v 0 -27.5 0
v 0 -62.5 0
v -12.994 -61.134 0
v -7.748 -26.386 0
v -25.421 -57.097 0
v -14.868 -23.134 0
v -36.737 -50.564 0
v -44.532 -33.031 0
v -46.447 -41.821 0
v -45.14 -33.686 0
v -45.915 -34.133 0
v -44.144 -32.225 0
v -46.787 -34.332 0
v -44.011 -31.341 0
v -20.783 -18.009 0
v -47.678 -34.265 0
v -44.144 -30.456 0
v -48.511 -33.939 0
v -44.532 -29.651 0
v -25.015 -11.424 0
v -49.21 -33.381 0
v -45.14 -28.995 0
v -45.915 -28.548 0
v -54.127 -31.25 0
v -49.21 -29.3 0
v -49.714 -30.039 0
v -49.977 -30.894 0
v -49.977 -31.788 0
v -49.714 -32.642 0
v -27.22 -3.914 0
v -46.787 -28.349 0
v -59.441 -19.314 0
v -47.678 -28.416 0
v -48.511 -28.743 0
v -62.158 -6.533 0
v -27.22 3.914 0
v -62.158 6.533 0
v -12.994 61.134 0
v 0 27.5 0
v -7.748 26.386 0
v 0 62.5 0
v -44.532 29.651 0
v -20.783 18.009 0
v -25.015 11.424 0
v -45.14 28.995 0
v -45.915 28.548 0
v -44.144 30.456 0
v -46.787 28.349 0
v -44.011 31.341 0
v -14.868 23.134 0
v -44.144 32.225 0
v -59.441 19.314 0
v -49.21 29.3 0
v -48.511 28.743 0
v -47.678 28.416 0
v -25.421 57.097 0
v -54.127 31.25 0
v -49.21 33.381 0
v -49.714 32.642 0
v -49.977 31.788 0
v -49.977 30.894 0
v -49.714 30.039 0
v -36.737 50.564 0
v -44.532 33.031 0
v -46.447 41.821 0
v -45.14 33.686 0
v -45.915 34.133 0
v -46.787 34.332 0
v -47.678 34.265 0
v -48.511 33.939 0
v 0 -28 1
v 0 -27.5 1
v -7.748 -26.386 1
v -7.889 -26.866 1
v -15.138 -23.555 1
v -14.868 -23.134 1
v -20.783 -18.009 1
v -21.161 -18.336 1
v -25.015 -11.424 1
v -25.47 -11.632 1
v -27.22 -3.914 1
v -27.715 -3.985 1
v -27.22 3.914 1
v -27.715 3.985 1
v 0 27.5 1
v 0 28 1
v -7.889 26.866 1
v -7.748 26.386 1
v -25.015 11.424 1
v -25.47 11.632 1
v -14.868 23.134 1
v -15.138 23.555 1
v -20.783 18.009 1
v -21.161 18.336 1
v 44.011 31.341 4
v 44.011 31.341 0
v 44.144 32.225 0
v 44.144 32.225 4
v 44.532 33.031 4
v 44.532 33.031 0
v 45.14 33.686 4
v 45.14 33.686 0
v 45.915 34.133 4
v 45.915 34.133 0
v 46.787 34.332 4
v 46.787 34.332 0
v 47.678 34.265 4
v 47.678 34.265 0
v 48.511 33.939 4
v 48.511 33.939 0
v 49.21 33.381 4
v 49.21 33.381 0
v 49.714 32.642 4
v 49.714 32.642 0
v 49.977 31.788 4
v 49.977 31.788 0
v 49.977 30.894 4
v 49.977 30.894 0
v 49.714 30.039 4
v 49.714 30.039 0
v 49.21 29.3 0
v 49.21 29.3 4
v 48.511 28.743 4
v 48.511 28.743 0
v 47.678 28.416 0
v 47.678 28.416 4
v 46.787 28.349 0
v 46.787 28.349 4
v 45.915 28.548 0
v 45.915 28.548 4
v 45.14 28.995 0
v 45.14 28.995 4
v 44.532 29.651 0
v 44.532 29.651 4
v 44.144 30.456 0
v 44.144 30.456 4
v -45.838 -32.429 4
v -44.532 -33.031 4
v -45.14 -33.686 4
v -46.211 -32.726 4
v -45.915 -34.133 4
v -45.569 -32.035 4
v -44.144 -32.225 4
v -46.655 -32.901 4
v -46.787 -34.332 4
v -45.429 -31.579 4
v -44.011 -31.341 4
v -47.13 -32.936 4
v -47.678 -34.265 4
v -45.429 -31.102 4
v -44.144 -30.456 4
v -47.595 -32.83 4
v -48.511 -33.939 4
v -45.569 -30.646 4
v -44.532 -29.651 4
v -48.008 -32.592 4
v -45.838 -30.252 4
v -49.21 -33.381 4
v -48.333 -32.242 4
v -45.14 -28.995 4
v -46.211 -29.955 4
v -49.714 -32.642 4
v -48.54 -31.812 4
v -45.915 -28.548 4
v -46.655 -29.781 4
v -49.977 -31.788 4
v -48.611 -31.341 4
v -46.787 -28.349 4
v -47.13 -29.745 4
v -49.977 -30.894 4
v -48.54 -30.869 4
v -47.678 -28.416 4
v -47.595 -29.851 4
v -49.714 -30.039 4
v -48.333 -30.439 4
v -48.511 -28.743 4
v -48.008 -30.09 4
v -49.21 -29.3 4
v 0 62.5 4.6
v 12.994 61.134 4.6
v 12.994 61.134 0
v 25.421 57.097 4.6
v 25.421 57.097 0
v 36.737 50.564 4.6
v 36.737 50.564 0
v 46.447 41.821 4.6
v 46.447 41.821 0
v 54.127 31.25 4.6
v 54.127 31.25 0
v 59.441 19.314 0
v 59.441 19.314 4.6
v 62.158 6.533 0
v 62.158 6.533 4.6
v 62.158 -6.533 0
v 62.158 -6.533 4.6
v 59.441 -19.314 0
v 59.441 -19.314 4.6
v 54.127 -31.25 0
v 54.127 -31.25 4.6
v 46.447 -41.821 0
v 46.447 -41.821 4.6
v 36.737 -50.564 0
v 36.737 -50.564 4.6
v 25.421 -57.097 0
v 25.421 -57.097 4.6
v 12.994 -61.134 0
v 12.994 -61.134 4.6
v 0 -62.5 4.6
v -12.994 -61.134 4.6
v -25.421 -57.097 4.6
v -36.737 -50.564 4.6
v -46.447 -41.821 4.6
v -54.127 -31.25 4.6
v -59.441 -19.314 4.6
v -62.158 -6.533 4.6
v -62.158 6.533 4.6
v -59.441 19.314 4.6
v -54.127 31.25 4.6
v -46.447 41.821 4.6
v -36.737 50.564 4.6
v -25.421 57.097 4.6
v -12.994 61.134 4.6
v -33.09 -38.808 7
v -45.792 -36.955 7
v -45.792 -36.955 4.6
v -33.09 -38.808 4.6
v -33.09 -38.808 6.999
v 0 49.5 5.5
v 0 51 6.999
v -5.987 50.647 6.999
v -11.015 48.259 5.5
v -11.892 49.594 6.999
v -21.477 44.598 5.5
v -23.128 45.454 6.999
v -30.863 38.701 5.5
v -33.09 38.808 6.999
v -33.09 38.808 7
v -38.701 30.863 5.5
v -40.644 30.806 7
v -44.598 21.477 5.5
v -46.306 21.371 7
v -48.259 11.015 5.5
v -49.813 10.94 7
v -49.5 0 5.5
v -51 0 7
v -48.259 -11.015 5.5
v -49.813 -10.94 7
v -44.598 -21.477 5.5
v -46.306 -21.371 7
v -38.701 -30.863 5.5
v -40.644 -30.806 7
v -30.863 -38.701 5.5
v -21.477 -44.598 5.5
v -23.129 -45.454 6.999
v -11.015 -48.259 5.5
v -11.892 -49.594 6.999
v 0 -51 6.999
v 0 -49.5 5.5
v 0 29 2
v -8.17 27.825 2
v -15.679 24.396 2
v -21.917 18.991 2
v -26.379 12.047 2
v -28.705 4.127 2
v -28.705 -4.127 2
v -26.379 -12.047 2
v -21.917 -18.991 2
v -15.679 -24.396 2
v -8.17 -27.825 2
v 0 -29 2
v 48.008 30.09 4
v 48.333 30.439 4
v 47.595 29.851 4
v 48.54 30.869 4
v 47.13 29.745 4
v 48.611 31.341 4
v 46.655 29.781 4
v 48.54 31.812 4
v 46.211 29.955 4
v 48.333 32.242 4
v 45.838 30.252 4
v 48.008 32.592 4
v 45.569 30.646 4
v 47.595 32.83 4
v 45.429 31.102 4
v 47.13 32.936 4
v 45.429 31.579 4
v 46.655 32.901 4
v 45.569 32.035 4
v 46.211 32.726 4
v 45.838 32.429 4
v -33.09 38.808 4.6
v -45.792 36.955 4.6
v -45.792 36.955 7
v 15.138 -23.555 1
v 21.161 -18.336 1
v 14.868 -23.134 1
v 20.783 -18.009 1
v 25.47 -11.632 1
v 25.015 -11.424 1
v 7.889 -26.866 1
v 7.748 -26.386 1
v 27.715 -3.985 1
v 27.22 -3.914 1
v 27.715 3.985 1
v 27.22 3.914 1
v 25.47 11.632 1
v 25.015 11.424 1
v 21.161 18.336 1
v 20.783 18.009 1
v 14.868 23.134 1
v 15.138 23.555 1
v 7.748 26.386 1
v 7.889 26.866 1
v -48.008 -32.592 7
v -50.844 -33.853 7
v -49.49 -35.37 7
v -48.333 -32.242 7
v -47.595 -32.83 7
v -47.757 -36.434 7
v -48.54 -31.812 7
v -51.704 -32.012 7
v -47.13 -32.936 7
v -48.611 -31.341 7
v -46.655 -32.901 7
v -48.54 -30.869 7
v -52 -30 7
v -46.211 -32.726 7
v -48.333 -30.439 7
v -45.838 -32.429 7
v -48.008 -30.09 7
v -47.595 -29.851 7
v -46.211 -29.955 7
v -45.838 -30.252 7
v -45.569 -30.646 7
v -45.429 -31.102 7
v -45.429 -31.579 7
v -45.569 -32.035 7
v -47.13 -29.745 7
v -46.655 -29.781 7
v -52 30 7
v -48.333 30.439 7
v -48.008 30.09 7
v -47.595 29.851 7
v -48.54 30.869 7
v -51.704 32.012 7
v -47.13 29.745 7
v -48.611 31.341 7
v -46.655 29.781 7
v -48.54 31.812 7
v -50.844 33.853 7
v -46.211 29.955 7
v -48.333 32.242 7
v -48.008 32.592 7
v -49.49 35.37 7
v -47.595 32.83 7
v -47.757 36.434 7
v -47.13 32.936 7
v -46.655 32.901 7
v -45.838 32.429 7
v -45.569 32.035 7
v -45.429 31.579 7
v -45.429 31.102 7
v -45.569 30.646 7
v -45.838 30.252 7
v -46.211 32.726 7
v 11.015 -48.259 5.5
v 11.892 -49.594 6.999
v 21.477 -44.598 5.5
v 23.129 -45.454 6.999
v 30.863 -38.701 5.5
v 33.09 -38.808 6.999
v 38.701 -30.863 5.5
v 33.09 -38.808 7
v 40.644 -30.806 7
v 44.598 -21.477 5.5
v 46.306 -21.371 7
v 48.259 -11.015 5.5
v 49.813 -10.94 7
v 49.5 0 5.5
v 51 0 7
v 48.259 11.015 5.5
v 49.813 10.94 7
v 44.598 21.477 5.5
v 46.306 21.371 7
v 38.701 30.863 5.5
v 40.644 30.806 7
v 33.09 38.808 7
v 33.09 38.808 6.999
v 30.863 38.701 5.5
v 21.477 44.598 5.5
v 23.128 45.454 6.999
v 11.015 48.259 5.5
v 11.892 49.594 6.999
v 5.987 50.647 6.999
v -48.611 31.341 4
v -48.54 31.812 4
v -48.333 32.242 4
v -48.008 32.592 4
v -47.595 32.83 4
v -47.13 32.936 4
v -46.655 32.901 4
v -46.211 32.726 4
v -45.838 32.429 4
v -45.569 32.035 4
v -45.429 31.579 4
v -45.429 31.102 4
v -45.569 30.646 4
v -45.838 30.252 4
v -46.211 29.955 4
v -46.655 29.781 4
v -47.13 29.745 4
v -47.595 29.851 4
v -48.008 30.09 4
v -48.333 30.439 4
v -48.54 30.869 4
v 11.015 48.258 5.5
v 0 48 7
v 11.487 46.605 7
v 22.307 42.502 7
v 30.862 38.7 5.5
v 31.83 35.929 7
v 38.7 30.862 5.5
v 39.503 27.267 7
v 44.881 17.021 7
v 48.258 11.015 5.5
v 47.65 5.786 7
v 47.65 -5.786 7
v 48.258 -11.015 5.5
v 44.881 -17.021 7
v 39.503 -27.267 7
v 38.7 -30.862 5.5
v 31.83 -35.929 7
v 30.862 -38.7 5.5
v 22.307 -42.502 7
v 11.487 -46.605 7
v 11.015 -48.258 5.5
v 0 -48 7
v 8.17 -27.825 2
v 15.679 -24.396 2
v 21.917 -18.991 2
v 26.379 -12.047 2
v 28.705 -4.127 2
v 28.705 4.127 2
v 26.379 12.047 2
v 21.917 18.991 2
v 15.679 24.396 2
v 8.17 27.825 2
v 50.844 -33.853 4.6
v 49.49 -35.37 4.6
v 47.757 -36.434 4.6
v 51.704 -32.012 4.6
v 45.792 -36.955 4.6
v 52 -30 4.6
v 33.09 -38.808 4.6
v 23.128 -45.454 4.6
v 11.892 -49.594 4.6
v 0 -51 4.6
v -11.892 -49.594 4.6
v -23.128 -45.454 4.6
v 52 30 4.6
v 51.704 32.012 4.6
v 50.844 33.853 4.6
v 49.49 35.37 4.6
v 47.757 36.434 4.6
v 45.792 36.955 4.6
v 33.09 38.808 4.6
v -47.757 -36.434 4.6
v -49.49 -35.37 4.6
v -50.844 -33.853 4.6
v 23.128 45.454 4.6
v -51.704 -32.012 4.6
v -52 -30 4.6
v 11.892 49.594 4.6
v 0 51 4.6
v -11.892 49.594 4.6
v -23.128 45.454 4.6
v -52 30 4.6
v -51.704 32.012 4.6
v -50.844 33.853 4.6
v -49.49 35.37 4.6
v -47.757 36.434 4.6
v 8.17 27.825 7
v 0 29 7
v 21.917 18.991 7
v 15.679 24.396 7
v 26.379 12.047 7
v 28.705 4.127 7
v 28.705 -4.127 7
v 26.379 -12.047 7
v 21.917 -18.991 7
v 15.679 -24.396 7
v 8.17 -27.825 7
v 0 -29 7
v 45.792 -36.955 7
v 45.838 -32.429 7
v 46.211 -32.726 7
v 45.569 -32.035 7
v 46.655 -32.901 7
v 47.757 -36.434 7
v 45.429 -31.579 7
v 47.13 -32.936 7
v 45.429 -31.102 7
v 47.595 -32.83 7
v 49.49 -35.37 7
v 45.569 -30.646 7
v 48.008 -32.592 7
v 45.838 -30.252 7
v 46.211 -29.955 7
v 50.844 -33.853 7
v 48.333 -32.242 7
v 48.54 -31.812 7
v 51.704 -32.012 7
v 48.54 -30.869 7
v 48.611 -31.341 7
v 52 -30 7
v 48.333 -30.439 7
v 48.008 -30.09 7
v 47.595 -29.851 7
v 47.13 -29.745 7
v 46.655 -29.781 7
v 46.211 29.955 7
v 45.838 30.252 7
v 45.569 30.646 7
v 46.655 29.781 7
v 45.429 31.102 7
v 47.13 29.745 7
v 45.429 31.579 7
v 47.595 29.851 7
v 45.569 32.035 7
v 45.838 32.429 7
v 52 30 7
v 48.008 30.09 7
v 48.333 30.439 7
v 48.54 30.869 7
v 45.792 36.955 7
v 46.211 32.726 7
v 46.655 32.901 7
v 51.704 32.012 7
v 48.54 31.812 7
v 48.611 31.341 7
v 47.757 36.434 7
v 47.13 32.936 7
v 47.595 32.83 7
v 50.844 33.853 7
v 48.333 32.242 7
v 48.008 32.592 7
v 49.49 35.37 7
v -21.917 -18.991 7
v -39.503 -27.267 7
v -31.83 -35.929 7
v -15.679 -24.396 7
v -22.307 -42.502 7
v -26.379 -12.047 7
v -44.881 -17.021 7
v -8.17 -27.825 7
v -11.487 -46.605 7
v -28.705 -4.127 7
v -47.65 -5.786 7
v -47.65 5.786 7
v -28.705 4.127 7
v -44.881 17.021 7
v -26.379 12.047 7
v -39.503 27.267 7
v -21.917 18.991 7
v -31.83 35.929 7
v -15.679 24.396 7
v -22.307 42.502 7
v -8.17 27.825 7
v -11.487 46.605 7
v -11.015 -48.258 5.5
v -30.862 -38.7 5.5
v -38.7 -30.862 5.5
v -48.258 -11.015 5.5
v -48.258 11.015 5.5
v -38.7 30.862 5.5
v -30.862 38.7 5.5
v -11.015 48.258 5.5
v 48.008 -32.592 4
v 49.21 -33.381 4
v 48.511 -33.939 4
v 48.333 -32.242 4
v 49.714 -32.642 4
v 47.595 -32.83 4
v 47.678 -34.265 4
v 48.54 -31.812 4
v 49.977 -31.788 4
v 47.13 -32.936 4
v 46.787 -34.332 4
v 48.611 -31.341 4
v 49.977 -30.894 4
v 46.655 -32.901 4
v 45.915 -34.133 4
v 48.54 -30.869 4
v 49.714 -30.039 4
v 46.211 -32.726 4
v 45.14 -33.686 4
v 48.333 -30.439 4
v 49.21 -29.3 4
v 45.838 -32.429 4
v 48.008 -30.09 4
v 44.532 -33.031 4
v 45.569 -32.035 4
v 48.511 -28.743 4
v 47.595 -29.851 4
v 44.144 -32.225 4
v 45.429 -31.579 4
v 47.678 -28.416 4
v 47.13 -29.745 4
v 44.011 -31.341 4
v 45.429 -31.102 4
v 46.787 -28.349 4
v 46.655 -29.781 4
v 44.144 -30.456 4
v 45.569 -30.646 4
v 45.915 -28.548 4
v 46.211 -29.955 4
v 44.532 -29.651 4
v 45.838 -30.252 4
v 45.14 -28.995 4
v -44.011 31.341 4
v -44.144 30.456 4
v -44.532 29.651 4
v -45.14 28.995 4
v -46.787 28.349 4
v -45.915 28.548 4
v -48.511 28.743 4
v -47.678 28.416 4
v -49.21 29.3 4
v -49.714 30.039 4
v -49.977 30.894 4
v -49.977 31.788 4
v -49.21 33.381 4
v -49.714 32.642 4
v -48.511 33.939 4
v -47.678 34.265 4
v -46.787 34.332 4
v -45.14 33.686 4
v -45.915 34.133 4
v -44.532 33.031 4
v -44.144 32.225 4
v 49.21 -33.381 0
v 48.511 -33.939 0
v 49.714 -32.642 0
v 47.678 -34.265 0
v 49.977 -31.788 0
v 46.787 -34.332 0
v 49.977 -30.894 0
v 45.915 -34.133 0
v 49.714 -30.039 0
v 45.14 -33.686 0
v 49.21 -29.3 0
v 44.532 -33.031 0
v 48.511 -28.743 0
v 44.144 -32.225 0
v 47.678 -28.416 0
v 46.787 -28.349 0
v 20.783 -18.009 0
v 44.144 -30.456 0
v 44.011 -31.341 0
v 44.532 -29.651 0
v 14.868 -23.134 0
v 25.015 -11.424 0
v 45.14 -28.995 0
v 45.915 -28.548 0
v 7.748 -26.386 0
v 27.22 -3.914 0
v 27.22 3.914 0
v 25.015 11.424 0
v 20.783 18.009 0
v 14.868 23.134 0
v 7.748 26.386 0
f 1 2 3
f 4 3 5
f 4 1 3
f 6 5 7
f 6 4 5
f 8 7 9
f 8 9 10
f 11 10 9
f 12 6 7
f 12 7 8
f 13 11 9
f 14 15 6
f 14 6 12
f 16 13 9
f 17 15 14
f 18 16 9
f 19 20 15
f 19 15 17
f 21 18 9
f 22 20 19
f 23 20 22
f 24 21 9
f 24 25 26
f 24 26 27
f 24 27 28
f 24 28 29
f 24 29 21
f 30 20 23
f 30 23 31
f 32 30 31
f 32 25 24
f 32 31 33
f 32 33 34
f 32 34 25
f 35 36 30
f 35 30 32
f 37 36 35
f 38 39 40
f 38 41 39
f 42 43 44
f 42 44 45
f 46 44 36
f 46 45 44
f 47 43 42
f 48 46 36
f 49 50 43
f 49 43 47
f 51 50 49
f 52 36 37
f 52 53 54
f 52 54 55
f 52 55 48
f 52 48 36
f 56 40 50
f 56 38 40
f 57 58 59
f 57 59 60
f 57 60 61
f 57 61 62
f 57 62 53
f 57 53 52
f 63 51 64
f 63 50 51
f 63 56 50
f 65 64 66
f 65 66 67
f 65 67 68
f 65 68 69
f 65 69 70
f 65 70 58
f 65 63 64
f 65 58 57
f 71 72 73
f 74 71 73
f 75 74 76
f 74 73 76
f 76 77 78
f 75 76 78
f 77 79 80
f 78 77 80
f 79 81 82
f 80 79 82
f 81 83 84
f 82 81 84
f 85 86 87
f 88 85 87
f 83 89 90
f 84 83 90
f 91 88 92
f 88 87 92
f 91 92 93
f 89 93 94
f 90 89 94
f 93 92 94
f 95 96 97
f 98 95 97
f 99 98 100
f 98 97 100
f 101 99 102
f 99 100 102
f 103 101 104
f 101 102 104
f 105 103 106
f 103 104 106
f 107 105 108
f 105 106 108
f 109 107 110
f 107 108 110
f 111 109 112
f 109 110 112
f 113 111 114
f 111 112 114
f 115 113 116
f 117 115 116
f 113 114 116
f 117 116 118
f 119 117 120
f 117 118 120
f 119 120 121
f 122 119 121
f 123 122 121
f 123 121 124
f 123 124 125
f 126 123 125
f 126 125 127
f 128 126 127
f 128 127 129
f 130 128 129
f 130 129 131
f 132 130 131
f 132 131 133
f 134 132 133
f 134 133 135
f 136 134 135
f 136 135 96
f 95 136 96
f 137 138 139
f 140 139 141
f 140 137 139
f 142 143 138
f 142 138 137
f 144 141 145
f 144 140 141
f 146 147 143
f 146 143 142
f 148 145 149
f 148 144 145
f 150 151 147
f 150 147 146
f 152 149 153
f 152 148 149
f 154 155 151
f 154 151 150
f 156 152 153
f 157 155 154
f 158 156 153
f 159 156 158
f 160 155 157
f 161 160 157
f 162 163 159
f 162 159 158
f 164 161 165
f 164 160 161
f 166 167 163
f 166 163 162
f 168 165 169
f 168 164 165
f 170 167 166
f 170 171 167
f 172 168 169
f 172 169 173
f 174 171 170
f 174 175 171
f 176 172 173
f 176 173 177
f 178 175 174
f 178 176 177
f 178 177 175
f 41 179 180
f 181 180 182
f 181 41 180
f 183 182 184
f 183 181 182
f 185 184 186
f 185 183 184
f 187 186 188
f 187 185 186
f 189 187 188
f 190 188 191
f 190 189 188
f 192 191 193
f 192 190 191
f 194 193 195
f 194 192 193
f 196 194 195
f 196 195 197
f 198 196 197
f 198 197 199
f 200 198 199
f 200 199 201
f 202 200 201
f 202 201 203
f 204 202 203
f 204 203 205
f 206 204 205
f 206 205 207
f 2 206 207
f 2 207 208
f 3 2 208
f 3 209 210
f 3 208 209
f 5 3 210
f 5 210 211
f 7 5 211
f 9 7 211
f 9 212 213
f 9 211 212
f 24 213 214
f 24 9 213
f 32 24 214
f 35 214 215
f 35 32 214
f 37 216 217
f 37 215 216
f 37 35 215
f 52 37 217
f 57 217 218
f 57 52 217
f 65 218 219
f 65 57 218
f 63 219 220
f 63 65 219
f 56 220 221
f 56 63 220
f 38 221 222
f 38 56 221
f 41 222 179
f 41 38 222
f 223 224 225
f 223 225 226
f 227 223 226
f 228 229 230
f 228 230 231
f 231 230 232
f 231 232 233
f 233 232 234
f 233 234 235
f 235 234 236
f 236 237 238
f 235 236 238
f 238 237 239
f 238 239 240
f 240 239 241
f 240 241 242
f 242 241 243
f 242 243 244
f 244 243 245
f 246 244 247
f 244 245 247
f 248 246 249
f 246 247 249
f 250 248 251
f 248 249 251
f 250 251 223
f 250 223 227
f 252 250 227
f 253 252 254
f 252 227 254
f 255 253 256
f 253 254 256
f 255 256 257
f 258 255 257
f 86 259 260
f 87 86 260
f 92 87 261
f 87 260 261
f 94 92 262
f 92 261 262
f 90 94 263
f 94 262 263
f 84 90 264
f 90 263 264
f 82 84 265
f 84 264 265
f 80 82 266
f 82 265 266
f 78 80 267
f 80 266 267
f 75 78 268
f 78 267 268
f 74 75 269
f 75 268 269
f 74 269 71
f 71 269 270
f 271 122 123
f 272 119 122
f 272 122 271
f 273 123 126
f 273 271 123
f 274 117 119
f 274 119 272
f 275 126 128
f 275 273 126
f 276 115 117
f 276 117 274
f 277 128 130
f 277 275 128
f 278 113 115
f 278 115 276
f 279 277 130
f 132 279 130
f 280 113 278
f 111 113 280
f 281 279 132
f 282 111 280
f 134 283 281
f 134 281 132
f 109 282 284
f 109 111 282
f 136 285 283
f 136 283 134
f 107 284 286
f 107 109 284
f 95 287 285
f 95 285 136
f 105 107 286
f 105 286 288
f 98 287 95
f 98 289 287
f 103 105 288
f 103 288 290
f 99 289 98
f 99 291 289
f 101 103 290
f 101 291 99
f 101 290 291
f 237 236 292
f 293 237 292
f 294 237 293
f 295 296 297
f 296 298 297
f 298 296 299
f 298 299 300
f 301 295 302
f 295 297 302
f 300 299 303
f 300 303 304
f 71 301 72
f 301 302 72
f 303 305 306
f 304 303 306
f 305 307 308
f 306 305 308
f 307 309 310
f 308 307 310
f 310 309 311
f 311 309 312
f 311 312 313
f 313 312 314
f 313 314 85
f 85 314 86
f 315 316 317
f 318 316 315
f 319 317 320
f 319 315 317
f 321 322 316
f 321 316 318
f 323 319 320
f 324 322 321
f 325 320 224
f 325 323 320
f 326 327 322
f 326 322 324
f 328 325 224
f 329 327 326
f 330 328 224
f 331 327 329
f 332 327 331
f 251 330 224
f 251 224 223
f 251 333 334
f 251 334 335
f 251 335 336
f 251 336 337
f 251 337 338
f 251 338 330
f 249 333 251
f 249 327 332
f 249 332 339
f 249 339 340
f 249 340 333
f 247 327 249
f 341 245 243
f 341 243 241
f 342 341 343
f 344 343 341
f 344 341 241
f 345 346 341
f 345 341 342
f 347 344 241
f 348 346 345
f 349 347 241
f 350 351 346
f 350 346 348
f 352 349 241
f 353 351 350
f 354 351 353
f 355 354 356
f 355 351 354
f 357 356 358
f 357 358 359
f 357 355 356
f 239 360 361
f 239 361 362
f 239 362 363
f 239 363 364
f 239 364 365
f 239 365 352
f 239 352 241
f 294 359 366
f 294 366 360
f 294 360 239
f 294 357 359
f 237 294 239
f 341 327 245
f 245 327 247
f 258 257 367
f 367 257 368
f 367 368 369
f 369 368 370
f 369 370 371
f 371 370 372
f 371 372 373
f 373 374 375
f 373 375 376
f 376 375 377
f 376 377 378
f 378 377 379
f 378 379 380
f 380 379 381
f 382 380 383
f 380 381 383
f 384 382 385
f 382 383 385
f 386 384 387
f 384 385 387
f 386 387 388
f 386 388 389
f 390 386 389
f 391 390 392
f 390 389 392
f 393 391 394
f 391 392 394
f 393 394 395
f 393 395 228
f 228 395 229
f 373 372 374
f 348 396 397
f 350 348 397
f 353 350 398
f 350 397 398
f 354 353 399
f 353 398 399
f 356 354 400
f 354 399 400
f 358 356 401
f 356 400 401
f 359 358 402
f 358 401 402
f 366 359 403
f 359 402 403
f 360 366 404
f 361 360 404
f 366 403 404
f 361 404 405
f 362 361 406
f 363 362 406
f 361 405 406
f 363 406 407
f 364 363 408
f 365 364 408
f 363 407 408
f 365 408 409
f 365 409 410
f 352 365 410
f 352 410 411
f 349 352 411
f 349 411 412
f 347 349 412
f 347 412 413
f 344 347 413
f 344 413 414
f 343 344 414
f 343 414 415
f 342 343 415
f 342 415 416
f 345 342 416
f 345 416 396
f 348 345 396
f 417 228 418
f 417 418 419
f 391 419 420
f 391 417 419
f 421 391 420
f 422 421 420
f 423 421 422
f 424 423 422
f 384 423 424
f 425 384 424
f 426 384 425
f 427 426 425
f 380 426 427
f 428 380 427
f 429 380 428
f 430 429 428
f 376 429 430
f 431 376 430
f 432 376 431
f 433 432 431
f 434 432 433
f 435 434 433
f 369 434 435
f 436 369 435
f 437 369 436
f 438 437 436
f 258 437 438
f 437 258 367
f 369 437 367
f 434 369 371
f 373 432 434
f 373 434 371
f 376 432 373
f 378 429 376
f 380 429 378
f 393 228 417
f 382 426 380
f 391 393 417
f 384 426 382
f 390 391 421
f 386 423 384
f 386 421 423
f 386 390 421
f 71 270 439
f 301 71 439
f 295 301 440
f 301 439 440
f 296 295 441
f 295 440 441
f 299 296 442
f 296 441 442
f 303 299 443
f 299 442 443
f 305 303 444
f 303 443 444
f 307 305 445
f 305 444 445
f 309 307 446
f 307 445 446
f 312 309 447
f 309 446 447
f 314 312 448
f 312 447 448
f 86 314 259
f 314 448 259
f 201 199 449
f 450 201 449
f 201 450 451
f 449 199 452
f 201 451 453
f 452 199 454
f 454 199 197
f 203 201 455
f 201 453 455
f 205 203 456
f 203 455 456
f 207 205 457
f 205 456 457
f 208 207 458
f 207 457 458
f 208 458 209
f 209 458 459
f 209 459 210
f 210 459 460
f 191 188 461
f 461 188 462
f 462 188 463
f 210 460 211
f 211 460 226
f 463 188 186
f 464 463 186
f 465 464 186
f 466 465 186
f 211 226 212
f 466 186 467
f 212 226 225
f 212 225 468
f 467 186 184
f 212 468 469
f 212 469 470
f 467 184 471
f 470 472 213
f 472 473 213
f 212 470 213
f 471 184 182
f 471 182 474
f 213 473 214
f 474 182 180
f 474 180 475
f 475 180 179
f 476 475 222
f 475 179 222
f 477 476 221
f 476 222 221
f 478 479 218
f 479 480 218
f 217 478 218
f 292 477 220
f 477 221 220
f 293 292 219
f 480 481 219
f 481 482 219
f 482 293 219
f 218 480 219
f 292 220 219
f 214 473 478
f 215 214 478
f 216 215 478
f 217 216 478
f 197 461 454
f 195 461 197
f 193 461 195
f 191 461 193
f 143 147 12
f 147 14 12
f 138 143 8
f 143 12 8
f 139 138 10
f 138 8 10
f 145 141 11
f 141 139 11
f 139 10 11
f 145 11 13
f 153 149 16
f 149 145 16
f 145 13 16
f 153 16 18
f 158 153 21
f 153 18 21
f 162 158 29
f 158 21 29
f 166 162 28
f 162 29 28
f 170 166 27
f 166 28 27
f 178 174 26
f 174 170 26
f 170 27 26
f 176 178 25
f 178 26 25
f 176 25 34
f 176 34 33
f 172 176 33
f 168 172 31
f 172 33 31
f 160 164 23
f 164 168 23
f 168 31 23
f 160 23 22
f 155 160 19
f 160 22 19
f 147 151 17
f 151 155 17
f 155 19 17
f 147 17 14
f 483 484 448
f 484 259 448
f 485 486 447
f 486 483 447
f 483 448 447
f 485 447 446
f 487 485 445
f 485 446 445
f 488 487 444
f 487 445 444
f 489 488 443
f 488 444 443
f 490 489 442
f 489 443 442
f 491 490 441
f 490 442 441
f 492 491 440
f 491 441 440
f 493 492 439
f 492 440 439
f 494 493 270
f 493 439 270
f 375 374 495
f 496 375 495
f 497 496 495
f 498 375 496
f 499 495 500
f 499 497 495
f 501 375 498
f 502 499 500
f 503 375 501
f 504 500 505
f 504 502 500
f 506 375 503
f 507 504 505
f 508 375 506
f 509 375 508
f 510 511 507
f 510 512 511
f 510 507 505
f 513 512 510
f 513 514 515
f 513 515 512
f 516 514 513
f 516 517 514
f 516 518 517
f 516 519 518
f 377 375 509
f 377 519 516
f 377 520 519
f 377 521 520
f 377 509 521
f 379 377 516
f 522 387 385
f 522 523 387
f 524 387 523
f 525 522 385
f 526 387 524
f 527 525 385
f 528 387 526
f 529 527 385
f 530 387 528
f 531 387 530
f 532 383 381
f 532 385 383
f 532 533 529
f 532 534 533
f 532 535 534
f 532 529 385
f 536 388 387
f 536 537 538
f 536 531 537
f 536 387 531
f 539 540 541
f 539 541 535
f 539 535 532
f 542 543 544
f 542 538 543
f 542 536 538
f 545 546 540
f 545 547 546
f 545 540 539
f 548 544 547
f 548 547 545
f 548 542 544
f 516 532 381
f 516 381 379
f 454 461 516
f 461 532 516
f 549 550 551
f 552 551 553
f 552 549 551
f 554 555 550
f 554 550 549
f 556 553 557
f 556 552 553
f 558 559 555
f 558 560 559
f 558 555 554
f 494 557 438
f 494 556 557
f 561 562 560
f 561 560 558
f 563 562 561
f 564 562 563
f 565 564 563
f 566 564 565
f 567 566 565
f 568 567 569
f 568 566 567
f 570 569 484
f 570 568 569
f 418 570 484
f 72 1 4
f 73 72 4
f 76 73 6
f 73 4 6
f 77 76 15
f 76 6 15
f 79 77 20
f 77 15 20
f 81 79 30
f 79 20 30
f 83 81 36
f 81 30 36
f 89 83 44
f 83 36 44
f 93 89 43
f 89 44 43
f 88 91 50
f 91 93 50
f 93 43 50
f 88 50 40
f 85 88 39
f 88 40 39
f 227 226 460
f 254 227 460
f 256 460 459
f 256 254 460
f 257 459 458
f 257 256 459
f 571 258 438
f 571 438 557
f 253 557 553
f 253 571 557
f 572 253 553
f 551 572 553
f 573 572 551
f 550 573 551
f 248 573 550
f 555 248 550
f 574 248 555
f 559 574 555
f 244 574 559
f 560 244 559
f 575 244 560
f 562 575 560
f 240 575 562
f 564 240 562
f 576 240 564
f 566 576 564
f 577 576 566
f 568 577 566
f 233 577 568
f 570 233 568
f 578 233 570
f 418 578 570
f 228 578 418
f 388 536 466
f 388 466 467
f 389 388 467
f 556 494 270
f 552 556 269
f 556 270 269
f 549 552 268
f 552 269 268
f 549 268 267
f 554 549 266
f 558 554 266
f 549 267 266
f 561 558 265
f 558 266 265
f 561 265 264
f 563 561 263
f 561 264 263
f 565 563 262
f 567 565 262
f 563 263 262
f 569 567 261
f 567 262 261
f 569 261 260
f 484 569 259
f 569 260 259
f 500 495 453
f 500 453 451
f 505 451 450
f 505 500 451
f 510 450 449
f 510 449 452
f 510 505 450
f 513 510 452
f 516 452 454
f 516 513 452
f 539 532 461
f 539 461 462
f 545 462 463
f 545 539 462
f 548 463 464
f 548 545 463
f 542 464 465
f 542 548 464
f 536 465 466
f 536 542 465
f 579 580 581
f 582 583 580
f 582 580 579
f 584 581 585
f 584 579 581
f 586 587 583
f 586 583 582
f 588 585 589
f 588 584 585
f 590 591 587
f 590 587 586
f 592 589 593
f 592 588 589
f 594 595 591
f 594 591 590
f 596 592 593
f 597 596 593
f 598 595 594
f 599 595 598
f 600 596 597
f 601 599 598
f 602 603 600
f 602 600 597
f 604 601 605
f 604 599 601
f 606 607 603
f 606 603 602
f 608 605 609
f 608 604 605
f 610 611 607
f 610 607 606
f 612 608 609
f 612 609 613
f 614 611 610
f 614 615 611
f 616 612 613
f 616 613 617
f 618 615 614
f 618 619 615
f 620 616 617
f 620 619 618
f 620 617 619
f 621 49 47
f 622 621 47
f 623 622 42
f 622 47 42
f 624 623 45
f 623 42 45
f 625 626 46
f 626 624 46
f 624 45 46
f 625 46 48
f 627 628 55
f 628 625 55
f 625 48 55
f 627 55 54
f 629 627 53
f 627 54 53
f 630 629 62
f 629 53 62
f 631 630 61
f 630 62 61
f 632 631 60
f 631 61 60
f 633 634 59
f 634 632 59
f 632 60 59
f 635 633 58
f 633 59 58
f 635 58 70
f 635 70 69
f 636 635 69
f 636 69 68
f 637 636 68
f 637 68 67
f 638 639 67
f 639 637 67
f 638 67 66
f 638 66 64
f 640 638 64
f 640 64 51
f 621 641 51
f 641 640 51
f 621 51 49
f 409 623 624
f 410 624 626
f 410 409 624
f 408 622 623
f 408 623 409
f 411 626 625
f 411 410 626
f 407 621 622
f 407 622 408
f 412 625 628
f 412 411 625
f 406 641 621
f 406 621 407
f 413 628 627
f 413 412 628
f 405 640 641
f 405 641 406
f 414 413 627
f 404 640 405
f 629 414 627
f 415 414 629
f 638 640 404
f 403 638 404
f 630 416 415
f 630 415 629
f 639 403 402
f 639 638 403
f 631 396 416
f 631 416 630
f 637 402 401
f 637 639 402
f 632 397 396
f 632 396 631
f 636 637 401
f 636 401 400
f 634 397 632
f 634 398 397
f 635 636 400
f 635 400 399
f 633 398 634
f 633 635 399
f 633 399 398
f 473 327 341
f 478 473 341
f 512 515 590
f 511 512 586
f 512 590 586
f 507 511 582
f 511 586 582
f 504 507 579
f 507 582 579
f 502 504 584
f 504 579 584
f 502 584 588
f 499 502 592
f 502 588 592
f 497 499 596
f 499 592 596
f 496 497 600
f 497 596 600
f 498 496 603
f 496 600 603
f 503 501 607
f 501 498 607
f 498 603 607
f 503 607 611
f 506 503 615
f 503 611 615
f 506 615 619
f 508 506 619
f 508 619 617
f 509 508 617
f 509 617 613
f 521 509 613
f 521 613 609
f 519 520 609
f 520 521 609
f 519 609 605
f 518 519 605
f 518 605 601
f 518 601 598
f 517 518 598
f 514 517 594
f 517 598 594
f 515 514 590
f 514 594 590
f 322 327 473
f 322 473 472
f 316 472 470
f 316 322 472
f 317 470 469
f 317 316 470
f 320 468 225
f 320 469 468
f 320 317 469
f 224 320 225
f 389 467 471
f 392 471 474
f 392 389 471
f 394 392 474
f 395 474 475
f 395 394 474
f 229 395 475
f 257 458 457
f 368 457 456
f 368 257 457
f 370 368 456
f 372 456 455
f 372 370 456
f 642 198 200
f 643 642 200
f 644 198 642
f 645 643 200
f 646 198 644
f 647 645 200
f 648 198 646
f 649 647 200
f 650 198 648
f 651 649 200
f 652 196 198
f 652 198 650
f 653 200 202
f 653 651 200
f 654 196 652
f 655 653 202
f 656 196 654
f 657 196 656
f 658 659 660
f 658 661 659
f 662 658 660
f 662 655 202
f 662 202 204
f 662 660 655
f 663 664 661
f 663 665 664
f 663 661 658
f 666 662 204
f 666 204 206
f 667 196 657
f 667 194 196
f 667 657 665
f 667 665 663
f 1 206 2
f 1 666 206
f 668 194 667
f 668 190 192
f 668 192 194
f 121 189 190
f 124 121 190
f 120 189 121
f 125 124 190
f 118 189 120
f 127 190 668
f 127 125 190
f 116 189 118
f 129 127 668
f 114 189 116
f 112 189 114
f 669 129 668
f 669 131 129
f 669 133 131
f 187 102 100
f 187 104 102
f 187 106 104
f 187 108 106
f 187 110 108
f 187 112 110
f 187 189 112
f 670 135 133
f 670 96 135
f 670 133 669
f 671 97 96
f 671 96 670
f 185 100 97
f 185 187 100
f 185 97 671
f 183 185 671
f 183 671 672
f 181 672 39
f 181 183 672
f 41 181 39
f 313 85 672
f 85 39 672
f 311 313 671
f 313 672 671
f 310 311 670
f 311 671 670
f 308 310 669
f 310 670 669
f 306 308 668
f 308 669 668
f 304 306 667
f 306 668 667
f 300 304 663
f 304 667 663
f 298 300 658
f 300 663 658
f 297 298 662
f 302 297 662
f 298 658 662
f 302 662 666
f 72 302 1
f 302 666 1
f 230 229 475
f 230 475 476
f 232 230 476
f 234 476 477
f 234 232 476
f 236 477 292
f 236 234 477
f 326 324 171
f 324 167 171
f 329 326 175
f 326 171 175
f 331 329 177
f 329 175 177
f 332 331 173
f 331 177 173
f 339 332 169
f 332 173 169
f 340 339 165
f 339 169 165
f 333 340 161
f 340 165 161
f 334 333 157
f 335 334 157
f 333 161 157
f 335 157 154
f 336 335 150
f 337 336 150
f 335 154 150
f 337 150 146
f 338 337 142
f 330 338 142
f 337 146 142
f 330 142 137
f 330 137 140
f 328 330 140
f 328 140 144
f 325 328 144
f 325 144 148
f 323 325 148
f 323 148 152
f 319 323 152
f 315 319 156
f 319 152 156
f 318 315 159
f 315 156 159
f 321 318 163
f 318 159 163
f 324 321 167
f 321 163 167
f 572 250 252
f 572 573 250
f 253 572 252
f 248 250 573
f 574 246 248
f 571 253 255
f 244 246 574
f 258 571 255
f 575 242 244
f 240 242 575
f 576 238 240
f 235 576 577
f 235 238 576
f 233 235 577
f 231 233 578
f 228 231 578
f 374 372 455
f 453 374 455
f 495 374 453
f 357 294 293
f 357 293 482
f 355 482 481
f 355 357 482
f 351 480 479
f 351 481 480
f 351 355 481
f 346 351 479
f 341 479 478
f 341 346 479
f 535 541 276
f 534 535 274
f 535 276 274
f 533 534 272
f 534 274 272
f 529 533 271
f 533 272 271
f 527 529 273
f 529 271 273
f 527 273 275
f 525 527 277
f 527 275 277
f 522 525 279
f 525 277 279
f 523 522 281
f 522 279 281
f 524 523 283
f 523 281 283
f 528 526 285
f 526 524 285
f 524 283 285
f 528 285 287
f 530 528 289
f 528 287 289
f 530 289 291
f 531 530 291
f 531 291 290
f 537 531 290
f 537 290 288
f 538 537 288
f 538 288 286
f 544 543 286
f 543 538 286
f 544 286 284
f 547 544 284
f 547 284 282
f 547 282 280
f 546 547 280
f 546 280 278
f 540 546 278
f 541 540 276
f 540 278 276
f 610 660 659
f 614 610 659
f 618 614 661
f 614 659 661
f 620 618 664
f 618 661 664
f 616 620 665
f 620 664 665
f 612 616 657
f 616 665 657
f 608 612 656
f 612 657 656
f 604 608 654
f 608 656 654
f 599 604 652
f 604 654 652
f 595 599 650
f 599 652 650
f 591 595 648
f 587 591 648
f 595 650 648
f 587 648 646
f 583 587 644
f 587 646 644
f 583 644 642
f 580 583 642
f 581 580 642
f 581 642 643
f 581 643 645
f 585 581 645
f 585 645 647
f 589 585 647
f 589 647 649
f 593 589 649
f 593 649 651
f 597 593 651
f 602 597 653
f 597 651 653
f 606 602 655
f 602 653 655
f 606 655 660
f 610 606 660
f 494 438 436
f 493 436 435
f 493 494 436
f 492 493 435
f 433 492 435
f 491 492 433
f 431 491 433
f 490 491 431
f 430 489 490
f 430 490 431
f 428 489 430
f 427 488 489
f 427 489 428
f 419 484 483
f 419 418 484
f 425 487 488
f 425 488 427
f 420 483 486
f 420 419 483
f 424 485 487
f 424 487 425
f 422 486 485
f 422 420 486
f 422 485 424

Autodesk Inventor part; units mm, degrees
ref_plane "YZ Plane" through (0, 0, 0) normal (1, 0, 0) x (0, 1, 0)
ref_plane "XZ Plane" through (0, 0, 0) normal (0, 1, 0) x (-1, 0, 0)
ref_plane "XY Plane" through (0, 0, 0) normal (0, 0, 1) x (1, 0, 0)
sketch "Sketch1" plane through (0, 0, 0) normal (0, 0, 1) x (1, 0, 0)
  circle A0 centre (-47.0107, -31.3407) radius 4.8
  arc A1 (51.632, -32.6385) -> (49.9861, -35.1073) centre (47.0107, -31.3407) ccw
  arc A2 (51.632, -32.6385) -> (51.632, 32.6385) centre (0, 0) ccw
  arc A3 (49.9861, 35.1073) -> (51.632, 32.6385) centre (47.0107, 31.3407) ccw
  arc A4 (49.9861, 35.1073) -> (-42.369, 44) centre (0, 0) ccw
  line L0 (-42.369, 44) -> (-62, 44)
  line L1 (-62, 44) -> (-64, 42)
  line L2 (-64, 42) -> (-64, 0.1)
  arc A5 (0, -61.083) -> (49.9861, -35.1073) centre (0, 0) ccw
  circle A6 centre (0, 0) radius 48
  circle A7 centre (-58, 38) radius 3.825
  circle A8 centre (-47.0107, 31.3407) radius 4.8
  line L3 (0, 0) -> (-74.8823, 0)
  circle A9 centre (-58, -38) radius 3.825
  line L4 (-42.369, -44) -> (-62, -44)
  arc A10 (-42.369, -44) -> (49.9861, -35.1073) centre (0, 0) ccw
  line L5 (-62, -44) -> (-64, -42)
  line L6 (-64, -42) -> (-64, 0.1)
extrude "Extrusion1" add sketch "Sketch1" along normal blind 4.8
sketch "Sketch5" plane through (0, 0, 4.8) normal (0, 0, 1) x (1, 0, 0)
  circle A0 centre (0, 0) radius 48 projected
  circle A1 centre (-47.0107, 31.3407) radius 4.8 projected
  circle A2 centre (0, 0) radius 61.5
  arc A3 (49.9861, 35.1073) -> (51.632, 32.6385) centre (47.0107, 31.3407) ccw projected
  circle A4 centre (47.0107, 31.3407) radius 1.6
  arc A5 (51.632, -32.6385) -> (49.9861, -35.1073) centre (47.0107, -31.3407) ccw projected
  circle A6 centre (47.0107, -31.3407) radius 1.6
  circle A7 centre (-47.0107, -31.3407) radius 4.8 projected
  circle A8 centre (-47.0107, -31.3407) radius 1.6
  circle A9 centre (-47.0107, 31.3407) radius 4.8 projected
  circle A10 centre (-47.0107, 31.3407) radius 1.6
  dimension "d14" = 123
  dimension "d41" = 3.2
  dimension "d42" = 3.2
  dimension "d43" = 3.2
  dimension "d44" = 3.2
extrude "Extrusion5" add sketch "Sketch5" against normal up to surface (4.8 mm away) contours A1 | A2 | A7
sketch "Sketch8" plane through (0, 0, 0) normal (0, 0, -1) x (-1, 0, 0)
  circle A0 centre (0, 0) radius 48 projected
  circle A1 centre (0, 0) radius 29
  dimension "d30" = 58
extrude "Extrusion8" add sketch "Sketch8" against normal up to surface (4.8 mm away)
sketch "Sketch9" plane through (0, 0, 0) normal (0, 0, -1) x (-1, 0, 0)
  circle A0 centre (0, 0) radius 29 projected
  circle A1 centre (0, 0) radius 27.5
  dimension "d33" = 1.5
extrude "Extrusion9" add sketch "Sketch9" against normal blind 1
chamfer "Chamfer3" distance 1 angle 45 1 edges at (29, 0, 1)
sketch "Sketch10" plane through (0, 0, 4.8) normal (0, 0, 1) x (1, 0, 0)
  circle A0 centre (0, 0) radius 29 projected
  circle A1 centre (-58, 38) radius 3.825 projected
  arc A2 (-42.968, -44) -> (-42.968, 44) centre (0, 0) ccw projected
  line L0 (-42.968, 44) -> (-62, 44) projected
  line L1 (-62, 44) -> (-64, 42) projected
  line L2 (-64, 42) -> (-64, -42) projected
  circle A3 centre (47.0107, 31.3407) radius 1.6 projected
  circle A4 centre (47.0107, -31.3407) radius 1.6 projected
  circle A5 centre (-47.0107, -31.3407) radius 1.6 projected
  circle A6 centre (-47.0107, 31.3407) radius 1.6 projected
  line L3 (-64, -42) -> (-62, -44) projected
  line L4 (-62, -44) -> (-42.968, -44) projected
  circle A7 centre (-58, -38) radius 3.825 projected
extrude "Extrusion10" add sketch "Sketch10" along normal blind 2.2
sketch "Sketch11" plane through (0, 0, 0) normal (0, 0, -1) x (-1, 0, 0)
  circle A0 centre (-47.0107, -31.3407) radius 1.6 projected
  circle A1 centre (-47.0107, -31.3407) radius 3
  circle A2 centre (-47.0107, 31.3407) radius 1.6 projected
  circle A3 centre (-47.0107, 31.3407) radius 3
  circle A4 centre (47.0107, 31.3407) radius 1.6 projected
  circle A5 centre (47.0107, 31.3407) radius 3
  circle A6 centre (47.0107, -31.3407) radius 1.6 projected
  circle A7 centre (47.0107, -31.3407) radius 3
  point P0 (0, 0)
  dimension "d45" = 6
  dimension "d46" = 6
  dimension "d47" = 6
  dimension "d48" = 6
extrude "Extrusion11" cut sketch "Sketch11" against normal blind 4 contours A1 | A3 | A5 | A6 | A7
sketch "Sketch12" plane through (0, 0, 7) normal (0, 0, 1) x (1, 0, 0)
  circle A0 centre (0, 0) radius 48
  circle A1 centre (0, 0) radius 51
  dimension "d51" = 96
  dimension "d52" = 3
extrude "Extrusion12" cut sketch "Sketch12" against normal blind 1.5
chamfer "Chamfer4" distance 1.5 angle 45 2 edges at (-51, 0, 5.5) (-48, 0, 5.5)
sketch "Sketch17" plane through (0, 0, 7) normal (0, 0, 1) x (1, 0, 0)
  circle A0 centre (0, 0) radius 61.5
  circle A1 centre (0, 0) radius 96.3014
  point P0 (-42.968, 44)
extrude "Extrusion15" cut sketch "Sketch17" against normal through all
sketch "Sketch19" plane through (0, 0, 0) normal (0, 0, -1) x (-1, 0, 0)
  circle A0 centre (-47.0107, -31.3407) radius 3 projected
  line L0 (0, 0) -> (-47.0107, -31.3407)
  line L1 (-47.0107, -31.3407) -> (-60.1837, -40.1228)
  circle A1 centre (0, 0) radius 65
  circle A2 centre (0, 0) radius 61.5 projected
  circle A3 centre (-54.0831, -36.0557) radius 2.05
  circle A4 centre (-54.0831, -36.0557) radius 4
  line L2 (-54.8676, -39.978) -> (-36.9294, -43.5656)
  line L3 (-58.0055, -35.2712) -> (-54.4179, -17.333)
  point P0 (-44.9634, -41.9588)
  point P1 (-56.0247, -25.367)
  point P2 (-58.0055, -35.2712)
  dimension "d67" = 130
  dimension "d69" = 8
  dimension "d68" = 4.1
  dimension "d70" = 45
extrude "Extrusion16" add sketch "Sketch19" against normal up to surface (7 mm away) contours A2 A4 A1 A3 L1 | L1 A3 A1 A4 A2 | A2 L2 A1 A4 | A4 A1 L3 A2 | A4 L3 A1 | A1 A3 L1 A4 | L2 A4 A1 | A4 L1 A3 A1
sketch "Sketch20" plane through (0, 0, 7) normal (0, 0, 1) x (1, 0, 0)
  arc A0 (33.0898, 38.808) -> (-18.5896, 47.4913) centre (0, 0) ccw
  line L0 (45.7919, 36.955) -> (33.0898, 38.808)
  arc A1 (51.7244, 28.0563) -> (45.7919, 36.955) centre (44.9997, 30) ccw
  line L1 (48.5496, 15.6186) -> (51.7244, 28.0563)
  arc A2 (48.5496, -15.6186) -> (48.5496, 15.6186) centre (0, 0) ccw
  line L2 (51.7244, -28.0563) -> (48.5496, -15.6186)
  arc A3 (45.7919, -36.955) -> (51.7244, -28.0563) centre (44.9997, -30) ccw
  line L3 (33.0898, -38.808) -> (45.7919, -36.955)
  arc A4 (-18.5896, -47.4913) -> (33.0898, -38.808) centre (0, 0) ccw
  line L4 (-33.7876, -44) -> (-18.5896, -47.4913)
  line L5 (-62, -44) -> (-33.7876, -44)
  line L6 (-64, -42) -> (-62, -44)
  line L7 (-64, 42) -> (-64, -42)
  line L8 (-62, 44) -> (-64, 42)
  line L9 (-33.7876, 44) -> (-62, 44)
  line L10 (-18.5896, 47.4913) -> (-33.7876, 44)
  circle A5 centre (0, 0) radius 88.8325
extrude "Extrusion17" cut sketch "Sketch20" against normal blind 2.4
sketch "Sketch21" plane through (0, 0, 0) normal (0, 0, -1) x (-1, 0, 0)
  circle A0 centre (0, 0) radius 78.6238
  circle A1 centre (0, 0) radius 61.5
extrude "Extrusion18" cut sketch "Sketch21" against normal through all
sketch "Sketch22" plane through (0, 0, 0) normal (0, 0, -1) x (-1, 0, 0)
  circle A0 centre (0, 0) radius 61.5 projected
  circle A1 centre (0, 0) radius 27.5 projected
  circle A2 centre (0, 0) radius 62.5
  dimension "d77" = 1
extrude "Extrusion19" add sketch "Sketch22" against normal up to surface (4.6 mm away) contours A2
sketch "Sketch23" plane through (0, 0, 7) normal (0, 0, 1) x (1, 0, 0)
  circle A0 centre (47.0107, 31.3407) radius 1.6 projected
  line L0 (48.5496, 15.6186) -> (51.7244, 28.0563) projected
  arc A1 (51.7244, 28.0563) -> (45.7919, 36.955) centre (44.9997, 30) ccw projected
  line L1 (45.7919, 36.955) -> (33.0898, 38.808) projected
  arc A2 (48.5496, 15.6186) -> (33.0898, 38.808) centre (0, 0) ccw projected
  line L2 (51.7244, -28.0563) -> (48.5496, -15.6186) projected
  arc A3 (33.0898, -38.808) -> (48.5496, -15.6186) centre (0, 0) ccw projected
  line L3 (33.0898, -38.808) -> (45.7919, -36.955) projected
  arc A4 (45.7919, -36.955) -> (51.7244, -28.0563) centre (44.9997, -30) ccw projected
  circle A5 centre (47.0107, -31.3407) radius 1.6 projected
  arc A6 (48.5496, -15.6186) -> (48.5496, 15.6186) centre (0, 0) ccw projected
  line L4 (51.9997, 39.8529) -> (51.9997, -52.1761)
  point P0 (51.9997, -30)
  point P1 (51.9997, 30)
extrude "Extrusion20" add sketch "Sketch23" against normal up to surface (2.4 mm away) contours L0 A1 L4 A4 L2 A6
sketch "Sketch24" plane through (0, 0, 7) normal (0, 0, 1) x (1, 0, 0)
  line L0 (0, -84.8798) -> (-71.6508, -84.8798)
  line L1 (-71.6508, -84.8798) -> (-71.6508, 87.4797)
  line L2 (-71.6508, 87.4797) -> (0, 87.4797)
  line L3 (0, 87.4797) -> (0, -84.8798)
  point P0 (0, 0)
extrude "Extrusion21" cut sketch "Sketch24" along normal through all both and the other way through all
mirror "Mirror1" about plane through (0, -84.8798, 7) normal (-1, 0, 0)
properties part number "frame_rring2"
